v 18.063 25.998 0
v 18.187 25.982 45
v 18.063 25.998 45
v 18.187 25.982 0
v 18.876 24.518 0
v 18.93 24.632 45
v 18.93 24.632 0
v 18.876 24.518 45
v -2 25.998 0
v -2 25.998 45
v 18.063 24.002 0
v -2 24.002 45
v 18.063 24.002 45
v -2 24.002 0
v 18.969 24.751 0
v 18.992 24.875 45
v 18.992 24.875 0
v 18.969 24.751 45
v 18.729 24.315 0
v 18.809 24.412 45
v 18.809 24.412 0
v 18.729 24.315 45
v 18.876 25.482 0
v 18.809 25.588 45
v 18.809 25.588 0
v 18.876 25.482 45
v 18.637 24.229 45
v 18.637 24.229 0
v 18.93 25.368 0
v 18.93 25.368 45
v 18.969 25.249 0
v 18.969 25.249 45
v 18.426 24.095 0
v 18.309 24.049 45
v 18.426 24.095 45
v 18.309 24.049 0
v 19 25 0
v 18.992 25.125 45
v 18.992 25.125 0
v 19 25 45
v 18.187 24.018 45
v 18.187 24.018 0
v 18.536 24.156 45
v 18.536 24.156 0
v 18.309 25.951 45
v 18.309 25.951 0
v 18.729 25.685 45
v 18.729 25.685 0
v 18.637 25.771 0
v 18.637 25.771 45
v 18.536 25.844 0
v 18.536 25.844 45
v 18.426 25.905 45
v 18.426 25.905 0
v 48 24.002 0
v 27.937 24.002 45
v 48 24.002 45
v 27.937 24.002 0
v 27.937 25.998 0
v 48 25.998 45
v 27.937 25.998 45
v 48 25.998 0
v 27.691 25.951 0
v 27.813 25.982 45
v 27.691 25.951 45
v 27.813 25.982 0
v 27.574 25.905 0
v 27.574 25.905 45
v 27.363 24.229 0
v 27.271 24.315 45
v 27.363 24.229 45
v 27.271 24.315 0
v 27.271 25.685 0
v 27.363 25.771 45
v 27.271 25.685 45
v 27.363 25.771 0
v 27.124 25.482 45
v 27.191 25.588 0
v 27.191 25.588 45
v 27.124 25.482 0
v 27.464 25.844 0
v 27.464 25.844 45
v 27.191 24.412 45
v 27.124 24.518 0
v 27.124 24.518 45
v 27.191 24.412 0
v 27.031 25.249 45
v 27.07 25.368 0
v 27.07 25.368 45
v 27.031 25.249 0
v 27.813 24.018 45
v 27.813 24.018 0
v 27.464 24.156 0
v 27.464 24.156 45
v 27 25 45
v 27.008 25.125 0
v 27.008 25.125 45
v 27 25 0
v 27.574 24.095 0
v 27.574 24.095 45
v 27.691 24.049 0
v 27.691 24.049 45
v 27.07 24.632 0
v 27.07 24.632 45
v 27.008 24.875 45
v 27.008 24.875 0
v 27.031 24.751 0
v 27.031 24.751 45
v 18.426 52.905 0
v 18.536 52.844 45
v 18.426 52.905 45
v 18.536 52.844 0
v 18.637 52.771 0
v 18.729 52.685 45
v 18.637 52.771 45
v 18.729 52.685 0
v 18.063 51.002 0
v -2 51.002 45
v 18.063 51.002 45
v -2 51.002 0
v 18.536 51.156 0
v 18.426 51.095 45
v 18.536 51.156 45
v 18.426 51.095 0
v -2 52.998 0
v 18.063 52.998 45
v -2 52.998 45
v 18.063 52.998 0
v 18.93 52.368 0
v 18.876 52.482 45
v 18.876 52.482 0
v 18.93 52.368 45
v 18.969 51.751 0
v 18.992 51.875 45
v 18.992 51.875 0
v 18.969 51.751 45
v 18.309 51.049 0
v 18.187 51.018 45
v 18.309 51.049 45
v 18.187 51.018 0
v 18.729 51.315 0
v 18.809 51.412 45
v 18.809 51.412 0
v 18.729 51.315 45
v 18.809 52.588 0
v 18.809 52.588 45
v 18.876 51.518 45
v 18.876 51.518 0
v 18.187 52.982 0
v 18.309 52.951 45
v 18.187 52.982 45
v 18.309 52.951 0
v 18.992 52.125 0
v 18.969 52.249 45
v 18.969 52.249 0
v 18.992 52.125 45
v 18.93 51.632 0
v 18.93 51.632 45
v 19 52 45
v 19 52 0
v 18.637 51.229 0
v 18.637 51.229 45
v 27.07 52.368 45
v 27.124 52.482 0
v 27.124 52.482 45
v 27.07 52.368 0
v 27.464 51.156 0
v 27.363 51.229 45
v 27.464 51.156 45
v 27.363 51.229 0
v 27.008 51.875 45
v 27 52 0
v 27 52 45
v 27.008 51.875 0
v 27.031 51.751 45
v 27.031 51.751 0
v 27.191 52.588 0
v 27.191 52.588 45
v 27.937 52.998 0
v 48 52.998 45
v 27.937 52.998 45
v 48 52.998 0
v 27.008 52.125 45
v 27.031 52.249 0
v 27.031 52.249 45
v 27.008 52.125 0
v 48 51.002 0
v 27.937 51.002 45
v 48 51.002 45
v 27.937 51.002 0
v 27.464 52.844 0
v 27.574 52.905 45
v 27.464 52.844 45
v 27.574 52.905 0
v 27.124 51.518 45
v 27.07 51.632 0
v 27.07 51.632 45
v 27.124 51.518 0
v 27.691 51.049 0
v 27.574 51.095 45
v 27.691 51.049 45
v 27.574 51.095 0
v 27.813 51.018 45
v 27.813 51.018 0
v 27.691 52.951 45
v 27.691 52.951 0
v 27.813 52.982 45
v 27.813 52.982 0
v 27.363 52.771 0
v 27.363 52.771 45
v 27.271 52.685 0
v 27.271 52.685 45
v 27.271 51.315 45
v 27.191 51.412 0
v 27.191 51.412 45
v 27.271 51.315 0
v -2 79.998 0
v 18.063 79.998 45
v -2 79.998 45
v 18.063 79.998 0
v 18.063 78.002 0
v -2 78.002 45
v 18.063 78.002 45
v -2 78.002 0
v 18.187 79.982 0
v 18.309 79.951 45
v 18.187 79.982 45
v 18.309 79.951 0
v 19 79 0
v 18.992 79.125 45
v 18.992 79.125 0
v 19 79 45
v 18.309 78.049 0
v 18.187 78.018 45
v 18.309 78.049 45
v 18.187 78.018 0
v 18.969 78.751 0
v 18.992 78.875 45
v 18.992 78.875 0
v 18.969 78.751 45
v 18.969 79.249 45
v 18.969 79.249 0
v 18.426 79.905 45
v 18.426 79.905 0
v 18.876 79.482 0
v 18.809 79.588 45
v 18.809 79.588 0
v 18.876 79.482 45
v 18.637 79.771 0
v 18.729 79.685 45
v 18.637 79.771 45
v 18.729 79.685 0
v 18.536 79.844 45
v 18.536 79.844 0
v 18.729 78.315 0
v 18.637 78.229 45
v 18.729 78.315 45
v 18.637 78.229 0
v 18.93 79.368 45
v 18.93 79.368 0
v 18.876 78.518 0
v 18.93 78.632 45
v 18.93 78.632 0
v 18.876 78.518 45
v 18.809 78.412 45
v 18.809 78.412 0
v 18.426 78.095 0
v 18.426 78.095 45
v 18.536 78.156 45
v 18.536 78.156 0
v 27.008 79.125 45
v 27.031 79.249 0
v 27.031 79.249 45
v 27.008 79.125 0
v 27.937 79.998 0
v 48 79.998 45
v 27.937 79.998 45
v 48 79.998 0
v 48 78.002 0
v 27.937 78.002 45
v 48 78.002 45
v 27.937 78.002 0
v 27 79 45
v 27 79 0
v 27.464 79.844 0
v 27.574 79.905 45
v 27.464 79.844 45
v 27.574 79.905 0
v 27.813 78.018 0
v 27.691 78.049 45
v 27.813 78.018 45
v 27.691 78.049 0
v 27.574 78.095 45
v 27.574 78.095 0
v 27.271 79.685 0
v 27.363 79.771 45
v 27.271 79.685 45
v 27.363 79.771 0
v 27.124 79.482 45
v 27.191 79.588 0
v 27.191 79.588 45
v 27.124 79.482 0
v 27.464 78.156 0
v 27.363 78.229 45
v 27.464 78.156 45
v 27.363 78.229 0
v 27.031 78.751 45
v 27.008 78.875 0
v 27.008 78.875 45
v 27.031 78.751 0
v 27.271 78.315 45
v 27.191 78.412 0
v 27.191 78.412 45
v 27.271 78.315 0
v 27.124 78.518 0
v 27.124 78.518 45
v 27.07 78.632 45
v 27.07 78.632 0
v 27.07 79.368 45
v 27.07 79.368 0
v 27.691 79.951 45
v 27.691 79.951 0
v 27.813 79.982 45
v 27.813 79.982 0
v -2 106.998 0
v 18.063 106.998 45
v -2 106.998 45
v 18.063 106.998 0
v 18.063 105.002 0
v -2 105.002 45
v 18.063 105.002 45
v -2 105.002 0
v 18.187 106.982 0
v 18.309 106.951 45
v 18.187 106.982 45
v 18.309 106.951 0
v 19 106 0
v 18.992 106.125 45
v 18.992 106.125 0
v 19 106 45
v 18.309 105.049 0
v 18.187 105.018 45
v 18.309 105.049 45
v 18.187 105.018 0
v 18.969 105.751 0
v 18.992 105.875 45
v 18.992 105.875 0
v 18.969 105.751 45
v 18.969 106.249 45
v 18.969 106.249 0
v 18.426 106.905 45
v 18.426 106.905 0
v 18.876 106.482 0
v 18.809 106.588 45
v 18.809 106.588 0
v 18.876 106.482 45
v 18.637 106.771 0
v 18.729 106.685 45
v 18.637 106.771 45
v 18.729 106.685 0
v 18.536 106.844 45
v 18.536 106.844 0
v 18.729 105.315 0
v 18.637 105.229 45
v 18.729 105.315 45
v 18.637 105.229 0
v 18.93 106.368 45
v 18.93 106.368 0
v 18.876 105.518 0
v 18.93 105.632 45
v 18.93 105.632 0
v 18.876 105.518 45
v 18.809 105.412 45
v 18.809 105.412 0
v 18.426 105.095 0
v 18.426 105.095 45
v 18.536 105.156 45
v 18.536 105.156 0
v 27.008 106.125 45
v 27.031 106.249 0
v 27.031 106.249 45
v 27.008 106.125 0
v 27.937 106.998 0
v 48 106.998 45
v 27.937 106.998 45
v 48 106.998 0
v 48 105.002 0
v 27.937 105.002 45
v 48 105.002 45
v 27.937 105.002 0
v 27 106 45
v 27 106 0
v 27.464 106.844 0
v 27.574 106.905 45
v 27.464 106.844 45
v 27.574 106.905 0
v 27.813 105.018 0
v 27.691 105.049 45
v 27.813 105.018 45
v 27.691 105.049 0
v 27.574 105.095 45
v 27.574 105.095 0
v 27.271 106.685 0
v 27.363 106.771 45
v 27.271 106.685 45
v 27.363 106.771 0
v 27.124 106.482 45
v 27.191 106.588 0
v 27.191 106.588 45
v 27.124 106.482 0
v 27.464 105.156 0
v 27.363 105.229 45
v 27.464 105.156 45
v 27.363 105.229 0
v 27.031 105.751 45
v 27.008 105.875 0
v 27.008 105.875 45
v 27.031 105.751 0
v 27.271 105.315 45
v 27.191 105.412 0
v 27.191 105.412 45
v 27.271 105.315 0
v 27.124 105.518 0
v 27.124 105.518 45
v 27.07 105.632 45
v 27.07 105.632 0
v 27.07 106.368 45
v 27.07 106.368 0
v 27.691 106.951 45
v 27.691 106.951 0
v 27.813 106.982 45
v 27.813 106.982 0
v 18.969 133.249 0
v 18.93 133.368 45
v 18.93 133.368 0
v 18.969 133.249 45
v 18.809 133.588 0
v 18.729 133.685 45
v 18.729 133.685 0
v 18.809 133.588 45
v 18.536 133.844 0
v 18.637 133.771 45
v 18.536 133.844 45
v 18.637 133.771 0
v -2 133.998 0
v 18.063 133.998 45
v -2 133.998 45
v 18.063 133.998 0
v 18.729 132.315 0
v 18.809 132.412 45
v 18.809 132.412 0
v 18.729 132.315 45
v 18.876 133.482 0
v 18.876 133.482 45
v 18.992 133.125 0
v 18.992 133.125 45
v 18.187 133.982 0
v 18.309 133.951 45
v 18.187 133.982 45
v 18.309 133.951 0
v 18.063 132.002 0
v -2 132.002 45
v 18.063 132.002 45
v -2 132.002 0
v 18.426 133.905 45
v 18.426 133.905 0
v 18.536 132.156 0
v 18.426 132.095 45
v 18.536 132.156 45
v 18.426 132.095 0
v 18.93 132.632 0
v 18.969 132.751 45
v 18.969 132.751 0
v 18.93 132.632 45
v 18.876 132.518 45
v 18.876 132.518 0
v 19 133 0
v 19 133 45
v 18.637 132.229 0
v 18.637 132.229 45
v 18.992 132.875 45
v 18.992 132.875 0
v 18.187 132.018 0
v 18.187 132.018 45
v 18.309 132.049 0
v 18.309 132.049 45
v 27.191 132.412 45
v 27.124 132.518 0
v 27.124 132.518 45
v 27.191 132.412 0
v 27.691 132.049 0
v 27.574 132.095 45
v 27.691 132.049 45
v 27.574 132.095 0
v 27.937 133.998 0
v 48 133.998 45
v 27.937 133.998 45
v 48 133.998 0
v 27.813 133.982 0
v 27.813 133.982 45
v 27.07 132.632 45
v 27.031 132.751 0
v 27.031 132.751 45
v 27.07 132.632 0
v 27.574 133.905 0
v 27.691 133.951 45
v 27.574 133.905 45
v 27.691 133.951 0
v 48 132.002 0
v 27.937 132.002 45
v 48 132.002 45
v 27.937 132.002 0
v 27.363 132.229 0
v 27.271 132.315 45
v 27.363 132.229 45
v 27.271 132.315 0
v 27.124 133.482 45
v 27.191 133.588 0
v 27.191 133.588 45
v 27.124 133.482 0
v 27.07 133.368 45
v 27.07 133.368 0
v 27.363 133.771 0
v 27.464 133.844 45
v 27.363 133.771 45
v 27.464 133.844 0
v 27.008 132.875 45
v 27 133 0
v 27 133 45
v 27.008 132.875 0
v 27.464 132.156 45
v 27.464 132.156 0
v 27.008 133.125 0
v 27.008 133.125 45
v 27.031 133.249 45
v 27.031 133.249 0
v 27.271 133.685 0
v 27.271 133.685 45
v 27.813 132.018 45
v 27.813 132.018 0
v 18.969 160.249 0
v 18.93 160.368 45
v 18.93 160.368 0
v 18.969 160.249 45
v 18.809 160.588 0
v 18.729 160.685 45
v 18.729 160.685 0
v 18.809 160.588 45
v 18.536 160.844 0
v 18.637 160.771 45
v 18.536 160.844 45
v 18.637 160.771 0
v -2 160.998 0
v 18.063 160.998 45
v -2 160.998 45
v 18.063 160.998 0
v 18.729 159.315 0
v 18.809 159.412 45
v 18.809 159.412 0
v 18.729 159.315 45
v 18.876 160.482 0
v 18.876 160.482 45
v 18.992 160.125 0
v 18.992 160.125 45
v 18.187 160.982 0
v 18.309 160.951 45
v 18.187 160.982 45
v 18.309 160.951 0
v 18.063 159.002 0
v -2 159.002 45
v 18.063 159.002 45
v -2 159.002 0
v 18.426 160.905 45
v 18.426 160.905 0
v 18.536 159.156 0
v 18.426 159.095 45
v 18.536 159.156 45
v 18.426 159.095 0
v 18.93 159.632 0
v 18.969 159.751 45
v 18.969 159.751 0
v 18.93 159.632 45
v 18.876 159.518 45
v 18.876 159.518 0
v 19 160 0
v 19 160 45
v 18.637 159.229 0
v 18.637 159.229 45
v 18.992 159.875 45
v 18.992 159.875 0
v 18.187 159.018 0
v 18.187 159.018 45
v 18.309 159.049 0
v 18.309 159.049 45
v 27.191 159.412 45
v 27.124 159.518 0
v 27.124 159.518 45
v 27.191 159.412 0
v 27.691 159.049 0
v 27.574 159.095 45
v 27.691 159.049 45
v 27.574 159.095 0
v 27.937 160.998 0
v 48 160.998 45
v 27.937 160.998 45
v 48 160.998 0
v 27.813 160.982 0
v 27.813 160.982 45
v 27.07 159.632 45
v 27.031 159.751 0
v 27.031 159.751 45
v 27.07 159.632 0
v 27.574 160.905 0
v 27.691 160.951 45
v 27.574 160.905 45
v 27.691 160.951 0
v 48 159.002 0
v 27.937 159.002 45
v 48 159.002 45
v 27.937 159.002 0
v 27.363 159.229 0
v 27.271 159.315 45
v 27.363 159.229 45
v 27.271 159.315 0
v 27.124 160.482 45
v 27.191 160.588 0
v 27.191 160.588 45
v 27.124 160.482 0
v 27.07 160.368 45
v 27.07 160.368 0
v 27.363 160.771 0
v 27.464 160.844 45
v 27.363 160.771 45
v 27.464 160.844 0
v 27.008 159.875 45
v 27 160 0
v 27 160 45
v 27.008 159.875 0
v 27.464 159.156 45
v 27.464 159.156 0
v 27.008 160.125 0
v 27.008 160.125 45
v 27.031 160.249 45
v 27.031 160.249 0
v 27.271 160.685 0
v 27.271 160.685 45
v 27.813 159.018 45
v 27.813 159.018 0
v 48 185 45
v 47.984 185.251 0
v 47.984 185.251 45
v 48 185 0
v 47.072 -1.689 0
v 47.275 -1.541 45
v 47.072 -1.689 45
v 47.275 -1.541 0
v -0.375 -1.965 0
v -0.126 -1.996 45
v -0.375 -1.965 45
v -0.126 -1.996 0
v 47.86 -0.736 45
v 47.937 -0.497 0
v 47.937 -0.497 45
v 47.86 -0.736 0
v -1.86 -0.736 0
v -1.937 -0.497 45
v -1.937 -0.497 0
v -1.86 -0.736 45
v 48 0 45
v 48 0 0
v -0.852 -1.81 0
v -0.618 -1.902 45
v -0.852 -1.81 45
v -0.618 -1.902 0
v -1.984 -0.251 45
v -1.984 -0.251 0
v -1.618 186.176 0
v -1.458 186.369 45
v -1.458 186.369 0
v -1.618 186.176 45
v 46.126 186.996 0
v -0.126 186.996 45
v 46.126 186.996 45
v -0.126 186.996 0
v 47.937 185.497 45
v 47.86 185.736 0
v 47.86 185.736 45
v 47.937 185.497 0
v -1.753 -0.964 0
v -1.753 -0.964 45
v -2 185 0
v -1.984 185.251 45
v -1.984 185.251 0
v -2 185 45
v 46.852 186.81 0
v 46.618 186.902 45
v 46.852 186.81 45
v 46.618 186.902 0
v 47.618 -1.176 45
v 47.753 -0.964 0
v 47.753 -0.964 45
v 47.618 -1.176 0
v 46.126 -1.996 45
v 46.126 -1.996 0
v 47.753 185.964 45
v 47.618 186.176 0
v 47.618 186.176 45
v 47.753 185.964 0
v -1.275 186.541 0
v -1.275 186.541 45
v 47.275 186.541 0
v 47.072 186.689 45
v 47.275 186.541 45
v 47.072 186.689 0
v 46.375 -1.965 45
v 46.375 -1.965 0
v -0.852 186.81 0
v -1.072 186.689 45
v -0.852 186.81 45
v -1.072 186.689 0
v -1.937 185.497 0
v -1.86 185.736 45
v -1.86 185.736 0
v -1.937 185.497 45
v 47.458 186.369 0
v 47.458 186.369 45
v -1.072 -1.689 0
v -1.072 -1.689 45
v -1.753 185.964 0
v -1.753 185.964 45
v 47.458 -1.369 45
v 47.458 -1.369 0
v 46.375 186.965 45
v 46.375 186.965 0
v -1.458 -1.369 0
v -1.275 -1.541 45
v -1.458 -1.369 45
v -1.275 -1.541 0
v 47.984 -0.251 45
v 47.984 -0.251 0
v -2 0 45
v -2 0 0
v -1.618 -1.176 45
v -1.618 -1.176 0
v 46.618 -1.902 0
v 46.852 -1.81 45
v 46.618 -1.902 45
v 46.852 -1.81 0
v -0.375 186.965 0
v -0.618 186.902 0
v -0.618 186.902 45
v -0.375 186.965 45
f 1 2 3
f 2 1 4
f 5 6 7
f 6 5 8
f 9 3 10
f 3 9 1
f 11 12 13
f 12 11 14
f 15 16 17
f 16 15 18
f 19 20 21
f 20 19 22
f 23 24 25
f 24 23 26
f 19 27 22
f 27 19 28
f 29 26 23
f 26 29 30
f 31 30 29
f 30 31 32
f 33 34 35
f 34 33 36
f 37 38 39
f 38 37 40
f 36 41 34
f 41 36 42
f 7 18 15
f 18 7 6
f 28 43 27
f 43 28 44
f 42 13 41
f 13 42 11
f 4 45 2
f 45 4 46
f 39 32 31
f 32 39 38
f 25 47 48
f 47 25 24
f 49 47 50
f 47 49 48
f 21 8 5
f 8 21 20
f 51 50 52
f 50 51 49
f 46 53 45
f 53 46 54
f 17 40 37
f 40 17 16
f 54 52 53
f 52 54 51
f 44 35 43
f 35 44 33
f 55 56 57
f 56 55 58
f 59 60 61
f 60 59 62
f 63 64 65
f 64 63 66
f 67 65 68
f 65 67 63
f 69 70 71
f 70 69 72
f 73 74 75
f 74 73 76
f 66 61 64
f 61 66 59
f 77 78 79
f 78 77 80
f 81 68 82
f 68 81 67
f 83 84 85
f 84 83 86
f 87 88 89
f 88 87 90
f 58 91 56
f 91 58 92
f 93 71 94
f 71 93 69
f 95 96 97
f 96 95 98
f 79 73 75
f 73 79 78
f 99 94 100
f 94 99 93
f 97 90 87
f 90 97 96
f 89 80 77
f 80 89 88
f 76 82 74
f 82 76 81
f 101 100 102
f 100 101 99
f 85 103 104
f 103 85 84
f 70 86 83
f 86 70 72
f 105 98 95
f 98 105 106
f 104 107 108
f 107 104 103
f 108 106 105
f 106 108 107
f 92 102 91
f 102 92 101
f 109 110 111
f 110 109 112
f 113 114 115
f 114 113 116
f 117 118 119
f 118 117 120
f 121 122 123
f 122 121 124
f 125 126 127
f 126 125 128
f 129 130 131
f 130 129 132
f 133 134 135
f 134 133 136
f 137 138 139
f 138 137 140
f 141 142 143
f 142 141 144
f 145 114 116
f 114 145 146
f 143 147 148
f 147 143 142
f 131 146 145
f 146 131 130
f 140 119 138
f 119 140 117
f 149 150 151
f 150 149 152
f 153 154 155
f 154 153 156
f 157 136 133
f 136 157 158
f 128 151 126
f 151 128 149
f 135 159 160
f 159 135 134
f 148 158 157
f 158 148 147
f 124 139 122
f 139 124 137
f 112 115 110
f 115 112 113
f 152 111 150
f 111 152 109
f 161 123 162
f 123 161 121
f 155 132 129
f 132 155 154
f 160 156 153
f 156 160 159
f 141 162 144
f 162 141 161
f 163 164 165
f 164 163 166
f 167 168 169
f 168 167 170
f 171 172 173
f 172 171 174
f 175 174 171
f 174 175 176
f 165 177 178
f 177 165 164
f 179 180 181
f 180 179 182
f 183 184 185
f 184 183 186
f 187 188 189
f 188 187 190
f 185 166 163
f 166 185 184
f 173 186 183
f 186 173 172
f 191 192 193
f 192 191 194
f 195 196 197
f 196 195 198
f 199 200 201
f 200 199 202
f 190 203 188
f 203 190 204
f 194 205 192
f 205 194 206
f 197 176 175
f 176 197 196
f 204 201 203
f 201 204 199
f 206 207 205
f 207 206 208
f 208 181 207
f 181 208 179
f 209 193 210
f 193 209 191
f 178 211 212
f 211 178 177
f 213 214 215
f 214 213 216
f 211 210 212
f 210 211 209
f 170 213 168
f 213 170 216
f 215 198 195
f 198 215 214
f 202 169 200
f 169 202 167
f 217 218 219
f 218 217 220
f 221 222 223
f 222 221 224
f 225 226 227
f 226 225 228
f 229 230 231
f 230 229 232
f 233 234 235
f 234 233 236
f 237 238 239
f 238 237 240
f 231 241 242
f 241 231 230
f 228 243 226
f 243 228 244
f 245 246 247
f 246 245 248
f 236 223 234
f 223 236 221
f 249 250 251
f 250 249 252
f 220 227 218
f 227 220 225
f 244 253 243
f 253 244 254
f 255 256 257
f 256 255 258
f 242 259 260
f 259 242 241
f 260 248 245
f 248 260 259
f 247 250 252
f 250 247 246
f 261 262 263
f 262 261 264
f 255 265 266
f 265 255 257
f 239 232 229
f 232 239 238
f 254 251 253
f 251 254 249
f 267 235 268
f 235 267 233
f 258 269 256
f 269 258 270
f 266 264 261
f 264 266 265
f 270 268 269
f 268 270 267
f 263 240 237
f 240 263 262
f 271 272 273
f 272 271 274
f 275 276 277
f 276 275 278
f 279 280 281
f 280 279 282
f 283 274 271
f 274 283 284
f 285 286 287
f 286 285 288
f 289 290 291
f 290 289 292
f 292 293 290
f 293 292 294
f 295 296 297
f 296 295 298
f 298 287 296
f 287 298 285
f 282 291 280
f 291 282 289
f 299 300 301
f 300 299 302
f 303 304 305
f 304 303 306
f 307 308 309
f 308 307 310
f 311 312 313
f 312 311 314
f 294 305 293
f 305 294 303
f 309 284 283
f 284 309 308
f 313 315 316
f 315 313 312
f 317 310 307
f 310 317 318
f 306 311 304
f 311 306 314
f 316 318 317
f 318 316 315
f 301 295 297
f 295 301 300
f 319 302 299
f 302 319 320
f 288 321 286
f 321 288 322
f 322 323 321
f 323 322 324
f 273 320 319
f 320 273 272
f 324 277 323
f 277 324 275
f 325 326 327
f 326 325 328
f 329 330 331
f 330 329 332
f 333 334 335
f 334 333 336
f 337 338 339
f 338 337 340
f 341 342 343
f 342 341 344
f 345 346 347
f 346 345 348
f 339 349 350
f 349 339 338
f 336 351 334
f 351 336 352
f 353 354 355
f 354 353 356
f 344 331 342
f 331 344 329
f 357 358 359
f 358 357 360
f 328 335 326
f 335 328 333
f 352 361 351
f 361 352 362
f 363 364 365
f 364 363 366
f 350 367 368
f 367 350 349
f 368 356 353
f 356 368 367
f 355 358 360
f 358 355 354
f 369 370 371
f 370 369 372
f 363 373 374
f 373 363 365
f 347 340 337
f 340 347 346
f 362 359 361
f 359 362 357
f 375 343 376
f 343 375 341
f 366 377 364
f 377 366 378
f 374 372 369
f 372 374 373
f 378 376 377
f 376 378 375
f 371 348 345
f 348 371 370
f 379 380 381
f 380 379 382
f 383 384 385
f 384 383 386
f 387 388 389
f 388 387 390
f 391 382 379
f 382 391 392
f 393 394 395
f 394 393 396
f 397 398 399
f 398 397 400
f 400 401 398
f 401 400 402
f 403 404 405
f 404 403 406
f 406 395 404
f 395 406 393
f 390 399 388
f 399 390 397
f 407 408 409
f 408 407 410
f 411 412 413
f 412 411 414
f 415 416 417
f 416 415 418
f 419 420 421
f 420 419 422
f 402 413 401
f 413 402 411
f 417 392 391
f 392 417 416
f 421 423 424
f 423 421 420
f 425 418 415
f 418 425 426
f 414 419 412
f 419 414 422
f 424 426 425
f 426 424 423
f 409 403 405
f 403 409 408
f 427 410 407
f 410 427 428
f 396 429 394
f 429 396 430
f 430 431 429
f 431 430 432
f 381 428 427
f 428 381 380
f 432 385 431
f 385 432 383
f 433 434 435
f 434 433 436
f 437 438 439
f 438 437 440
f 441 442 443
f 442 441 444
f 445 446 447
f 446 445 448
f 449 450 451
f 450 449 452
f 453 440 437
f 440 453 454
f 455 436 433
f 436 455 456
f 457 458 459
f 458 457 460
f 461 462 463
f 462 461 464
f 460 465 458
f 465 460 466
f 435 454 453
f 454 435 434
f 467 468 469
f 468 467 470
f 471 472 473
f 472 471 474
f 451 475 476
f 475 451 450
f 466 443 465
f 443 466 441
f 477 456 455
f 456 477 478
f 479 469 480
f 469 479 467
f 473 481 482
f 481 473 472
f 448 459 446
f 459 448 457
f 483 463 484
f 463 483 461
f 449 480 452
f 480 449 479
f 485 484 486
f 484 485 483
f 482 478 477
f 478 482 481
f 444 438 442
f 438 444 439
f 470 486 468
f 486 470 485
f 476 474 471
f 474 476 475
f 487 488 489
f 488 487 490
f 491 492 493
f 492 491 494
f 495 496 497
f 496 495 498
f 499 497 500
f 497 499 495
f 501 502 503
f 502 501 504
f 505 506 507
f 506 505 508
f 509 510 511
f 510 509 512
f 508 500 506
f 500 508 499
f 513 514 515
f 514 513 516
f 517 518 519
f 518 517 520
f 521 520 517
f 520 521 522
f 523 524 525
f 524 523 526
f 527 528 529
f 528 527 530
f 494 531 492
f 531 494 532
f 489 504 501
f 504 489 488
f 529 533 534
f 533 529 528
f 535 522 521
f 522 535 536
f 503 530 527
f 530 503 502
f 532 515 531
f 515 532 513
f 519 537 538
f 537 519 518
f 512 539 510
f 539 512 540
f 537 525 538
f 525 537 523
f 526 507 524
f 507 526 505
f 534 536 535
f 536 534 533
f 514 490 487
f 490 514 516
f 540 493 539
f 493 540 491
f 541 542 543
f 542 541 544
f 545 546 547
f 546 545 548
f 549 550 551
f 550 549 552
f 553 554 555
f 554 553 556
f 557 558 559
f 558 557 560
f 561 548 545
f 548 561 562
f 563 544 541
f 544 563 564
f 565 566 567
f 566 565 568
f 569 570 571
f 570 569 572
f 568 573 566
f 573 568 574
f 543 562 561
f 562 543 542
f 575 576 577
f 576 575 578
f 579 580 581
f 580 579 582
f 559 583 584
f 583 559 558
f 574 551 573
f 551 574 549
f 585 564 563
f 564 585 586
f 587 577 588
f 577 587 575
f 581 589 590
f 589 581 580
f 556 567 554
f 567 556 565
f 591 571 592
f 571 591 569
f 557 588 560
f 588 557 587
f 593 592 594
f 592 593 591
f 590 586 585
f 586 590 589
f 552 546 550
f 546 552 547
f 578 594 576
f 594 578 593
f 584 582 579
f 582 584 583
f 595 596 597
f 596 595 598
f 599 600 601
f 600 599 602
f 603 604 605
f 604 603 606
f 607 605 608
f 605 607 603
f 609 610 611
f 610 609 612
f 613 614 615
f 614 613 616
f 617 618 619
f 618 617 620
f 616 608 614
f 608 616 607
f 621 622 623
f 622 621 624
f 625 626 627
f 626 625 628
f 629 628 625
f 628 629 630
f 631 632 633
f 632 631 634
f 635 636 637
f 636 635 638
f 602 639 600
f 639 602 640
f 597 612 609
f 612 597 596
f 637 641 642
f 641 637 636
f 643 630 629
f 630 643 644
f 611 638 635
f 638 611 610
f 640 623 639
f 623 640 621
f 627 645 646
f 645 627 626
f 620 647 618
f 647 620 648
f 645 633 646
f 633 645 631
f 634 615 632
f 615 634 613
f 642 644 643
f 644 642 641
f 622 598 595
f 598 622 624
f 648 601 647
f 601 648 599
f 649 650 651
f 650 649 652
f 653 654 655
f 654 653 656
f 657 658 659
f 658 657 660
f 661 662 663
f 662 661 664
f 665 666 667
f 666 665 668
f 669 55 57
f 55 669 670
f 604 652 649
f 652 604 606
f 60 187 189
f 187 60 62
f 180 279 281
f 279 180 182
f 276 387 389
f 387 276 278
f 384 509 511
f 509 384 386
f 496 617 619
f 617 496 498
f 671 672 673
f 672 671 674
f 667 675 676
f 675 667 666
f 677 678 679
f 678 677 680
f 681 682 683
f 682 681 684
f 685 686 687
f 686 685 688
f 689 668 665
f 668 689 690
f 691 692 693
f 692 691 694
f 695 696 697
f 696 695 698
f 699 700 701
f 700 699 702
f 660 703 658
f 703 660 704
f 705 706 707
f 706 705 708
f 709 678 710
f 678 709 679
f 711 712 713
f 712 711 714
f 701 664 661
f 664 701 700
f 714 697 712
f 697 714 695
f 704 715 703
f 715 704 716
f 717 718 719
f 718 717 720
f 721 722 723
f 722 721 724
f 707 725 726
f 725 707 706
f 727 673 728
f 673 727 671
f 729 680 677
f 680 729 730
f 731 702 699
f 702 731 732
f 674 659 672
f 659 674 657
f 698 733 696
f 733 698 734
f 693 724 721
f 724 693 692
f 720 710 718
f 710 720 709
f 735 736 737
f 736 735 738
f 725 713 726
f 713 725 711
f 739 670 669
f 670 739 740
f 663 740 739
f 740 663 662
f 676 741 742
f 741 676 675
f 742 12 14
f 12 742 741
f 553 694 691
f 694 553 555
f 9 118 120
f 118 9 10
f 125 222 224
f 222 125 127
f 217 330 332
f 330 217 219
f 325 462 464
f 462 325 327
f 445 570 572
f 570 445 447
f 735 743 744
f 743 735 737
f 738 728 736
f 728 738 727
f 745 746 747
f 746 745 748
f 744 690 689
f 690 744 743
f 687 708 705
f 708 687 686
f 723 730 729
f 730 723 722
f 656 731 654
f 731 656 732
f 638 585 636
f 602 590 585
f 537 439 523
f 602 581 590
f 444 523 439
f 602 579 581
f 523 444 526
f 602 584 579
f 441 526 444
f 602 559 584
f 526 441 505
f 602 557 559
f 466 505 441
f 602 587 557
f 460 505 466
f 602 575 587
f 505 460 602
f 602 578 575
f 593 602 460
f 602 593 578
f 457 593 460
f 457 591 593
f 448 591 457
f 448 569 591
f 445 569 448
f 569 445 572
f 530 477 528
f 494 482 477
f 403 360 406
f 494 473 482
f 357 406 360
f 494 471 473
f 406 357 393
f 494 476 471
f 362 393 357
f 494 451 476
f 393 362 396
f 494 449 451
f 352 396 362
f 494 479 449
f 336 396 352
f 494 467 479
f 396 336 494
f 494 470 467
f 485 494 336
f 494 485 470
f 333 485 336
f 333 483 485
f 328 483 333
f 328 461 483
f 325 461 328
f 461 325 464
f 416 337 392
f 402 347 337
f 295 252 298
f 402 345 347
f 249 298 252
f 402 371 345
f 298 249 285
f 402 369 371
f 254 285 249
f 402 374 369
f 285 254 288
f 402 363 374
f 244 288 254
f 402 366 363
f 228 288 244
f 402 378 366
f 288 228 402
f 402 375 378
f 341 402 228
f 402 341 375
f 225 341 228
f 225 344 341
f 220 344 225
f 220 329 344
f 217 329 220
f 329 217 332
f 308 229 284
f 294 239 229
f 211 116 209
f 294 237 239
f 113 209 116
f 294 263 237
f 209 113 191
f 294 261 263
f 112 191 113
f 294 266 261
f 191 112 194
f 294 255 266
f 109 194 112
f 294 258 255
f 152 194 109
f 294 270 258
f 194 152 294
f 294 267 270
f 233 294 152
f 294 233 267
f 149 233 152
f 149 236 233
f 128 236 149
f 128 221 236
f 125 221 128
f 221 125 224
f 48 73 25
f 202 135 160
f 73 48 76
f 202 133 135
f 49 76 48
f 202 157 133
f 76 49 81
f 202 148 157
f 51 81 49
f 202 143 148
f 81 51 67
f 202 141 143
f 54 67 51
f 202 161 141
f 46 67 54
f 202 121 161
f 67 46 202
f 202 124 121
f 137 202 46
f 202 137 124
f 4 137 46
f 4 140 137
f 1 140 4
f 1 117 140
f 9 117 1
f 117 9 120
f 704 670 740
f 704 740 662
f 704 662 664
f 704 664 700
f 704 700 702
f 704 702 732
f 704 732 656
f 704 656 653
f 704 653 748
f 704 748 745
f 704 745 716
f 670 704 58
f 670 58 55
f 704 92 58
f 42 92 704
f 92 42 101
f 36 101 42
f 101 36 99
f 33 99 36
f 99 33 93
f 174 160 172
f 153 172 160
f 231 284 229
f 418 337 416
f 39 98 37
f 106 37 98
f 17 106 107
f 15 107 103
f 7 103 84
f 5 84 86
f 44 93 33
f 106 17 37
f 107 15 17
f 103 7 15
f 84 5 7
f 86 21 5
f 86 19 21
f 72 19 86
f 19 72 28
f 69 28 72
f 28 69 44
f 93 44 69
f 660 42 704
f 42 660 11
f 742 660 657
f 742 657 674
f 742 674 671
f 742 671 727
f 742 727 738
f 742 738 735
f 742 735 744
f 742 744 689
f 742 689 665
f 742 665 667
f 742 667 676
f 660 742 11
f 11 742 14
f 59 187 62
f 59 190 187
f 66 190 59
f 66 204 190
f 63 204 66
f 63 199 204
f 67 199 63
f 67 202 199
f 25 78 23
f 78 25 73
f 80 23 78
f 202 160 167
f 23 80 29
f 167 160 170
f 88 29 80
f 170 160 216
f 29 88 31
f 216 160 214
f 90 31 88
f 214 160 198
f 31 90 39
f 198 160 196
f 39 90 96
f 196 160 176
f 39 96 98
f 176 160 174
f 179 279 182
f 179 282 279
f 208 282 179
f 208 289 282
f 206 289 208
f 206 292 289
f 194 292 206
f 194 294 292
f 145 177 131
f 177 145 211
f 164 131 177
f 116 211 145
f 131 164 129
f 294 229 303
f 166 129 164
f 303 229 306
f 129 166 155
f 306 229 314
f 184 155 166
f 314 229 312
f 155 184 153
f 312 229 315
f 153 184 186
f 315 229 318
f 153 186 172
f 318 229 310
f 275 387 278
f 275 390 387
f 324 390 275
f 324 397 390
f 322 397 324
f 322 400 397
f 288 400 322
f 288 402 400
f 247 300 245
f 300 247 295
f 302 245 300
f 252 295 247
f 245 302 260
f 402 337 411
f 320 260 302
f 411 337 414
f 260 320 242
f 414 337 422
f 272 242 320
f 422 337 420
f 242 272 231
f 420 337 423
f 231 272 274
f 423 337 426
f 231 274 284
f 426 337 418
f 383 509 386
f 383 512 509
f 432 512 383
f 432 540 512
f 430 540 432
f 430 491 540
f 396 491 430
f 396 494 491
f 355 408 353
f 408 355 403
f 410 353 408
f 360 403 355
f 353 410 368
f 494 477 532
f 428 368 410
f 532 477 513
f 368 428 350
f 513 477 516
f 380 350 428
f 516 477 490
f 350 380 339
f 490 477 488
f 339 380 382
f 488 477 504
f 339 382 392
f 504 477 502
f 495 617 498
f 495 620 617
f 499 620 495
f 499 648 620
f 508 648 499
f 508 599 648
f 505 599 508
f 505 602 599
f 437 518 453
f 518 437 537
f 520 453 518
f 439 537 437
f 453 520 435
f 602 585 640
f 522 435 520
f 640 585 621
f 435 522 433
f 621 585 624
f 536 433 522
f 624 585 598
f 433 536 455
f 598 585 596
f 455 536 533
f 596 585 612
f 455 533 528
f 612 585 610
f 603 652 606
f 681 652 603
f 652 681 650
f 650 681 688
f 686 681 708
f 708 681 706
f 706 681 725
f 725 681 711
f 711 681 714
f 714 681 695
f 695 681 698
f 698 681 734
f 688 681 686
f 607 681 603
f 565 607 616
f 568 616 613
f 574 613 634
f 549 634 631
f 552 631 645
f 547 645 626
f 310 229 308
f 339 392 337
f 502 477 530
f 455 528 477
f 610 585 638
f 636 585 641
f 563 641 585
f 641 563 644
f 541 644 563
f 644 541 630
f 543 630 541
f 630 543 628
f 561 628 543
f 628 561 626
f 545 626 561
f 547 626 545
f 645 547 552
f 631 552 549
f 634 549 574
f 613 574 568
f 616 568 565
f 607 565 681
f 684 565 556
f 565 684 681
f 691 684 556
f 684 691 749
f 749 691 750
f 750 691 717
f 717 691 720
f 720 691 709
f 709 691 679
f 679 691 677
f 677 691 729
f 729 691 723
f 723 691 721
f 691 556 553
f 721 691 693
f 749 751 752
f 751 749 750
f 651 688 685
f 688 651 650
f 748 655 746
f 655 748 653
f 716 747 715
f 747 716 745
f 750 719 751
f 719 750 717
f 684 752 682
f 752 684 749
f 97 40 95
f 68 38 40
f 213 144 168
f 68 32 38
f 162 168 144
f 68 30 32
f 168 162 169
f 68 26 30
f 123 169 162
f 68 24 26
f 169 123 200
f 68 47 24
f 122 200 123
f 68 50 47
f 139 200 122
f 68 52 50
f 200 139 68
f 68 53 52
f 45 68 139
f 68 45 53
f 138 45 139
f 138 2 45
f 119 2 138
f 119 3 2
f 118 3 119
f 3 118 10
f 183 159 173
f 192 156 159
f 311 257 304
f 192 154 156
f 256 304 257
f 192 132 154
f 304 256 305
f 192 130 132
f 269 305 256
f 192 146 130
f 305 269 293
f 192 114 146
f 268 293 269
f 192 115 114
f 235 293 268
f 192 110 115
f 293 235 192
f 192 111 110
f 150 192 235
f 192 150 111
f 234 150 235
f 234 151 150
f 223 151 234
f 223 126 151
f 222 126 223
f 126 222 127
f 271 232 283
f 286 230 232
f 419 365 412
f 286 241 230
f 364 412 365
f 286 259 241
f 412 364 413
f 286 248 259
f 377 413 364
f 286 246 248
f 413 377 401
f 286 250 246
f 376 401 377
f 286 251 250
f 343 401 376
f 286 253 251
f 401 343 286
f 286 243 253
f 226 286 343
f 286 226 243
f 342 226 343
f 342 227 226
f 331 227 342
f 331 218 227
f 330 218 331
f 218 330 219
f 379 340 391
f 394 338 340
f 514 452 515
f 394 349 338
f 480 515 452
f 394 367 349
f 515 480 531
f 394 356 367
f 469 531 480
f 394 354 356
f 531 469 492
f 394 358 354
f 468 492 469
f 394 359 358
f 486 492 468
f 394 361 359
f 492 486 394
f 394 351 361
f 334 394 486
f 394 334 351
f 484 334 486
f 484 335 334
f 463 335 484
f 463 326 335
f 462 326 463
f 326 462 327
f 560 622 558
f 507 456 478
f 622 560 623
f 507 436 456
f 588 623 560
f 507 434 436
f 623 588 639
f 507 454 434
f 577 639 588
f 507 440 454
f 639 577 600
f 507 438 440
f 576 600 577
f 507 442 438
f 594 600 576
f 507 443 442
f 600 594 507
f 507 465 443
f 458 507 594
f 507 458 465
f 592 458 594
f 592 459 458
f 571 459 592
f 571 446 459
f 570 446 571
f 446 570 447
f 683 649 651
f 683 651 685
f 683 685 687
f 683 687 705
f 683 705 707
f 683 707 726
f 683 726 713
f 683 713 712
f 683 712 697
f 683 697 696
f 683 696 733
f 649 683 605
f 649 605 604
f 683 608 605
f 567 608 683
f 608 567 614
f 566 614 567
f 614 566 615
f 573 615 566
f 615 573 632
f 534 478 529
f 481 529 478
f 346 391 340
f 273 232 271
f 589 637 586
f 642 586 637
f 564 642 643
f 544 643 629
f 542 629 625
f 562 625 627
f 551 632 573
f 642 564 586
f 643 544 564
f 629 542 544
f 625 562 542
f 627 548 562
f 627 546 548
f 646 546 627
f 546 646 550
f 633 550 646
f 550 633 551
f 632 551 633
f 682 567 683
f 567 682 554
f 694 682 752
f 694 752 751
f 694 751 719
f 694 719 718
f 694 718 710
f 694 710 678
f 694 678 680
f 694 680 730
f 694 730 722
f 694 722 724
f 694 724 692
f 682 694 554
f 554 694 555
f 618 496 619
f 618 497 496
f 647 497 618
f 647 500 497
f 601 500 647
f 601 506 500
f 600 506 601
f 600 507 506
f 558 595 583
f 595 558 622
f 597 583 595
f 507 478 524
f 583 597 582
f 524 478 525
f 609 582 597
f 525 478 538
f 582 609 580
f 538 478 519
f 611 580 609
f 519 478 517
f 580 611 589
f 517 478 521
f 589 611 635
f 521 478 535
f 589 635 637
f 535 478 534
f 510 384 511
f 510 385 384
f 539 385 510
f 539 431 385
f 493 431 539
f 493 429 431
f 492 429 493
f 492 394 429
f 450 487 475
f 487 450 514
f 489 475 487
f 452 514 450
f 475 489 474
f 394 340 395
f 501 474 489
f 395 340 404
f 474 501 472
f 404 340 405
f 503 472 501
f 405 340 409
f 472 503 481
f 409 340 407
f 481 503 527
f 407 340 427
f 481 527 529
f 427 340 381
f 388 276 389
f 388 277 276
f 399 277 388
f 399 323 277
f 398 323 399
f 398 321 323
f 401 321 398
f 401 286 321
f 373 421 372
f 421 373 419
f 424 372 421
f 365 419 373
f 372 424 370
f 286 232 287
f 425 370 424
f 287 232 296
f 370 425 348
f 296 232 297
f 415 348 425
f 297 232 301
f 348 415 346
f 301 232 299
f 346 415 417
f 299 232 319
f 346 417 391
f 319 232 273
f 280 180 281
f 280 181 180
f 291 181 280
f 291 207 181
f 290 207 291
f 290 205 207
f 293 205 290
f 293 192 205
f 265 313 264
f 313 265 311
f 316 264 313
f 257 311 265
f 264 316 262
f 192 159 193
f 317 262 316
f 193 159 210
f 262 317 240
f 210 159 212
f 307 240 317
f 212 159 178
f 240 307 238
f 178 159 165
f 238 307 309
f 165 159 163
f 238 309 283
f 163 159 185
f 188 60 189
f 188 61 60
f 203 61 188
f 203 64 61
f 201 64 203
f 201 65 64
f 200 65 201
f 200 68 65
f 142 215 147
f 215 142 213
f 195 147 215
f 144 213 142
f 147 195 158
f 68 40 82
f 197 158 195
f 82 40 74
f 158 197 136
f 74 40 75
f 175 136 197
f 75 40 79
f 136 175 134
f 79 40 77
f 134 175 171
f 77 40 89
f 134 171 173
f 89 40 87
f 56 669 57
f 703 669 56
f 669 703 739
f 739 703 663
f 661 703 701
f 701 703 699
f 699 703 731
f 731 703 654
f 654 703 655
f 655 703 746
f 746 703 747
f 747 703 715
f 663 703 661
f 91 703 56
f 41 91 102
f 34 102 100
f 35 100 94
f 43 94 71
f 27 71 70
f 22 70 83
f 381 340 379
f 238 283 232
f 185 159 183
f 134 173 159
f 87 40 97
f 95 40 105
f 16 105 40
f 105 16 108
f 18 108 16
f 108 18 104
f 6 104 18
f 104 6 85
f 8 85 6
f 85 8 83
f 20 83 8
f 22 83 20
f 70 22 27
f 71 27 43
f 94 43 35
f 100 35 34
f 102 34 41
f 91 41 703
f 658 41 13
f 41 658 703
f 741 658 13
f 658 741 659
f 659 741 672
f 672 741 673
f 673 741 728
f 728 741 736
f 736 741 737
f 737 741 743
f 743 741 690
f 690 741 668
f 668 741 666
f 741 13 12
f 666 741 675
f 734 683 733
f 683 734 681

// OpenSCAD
total_boxes=7;
box_width=50;
box_length=25;
box_height=45;
border_radius=2;
separator_width=2;
separator_gap=10;
$fn=50;

cyl_r           = separator_width/2;
bar_width       = (box_width - separator_gap) / 2;
cutter_z_depth  = -1 * separator_width; 
cutter_z_offset = 2 * separator_width;
total_separator = (total_boxes == 1) ? 0 : total_boxes - 1;
total_length    = (box_length * total_boxes) + (separator_width * total_separator) - border_radius;
total_width     = box_width - (border_radius * 2);

module bar(y_position){
    hull(){
        translate([-10, y_position, cutter_z_depth]) cylinder(r=cyl_r, h=box_height + cutter_z_offset);
        translate([bar_width - separator_width, y_position, cutter_z_depth]) cylinder(r=cyl_r, h=box_height + cutter_z_offset);
    }
    hull(){
        translate([(bar_width + separator_gap) - separator_width, y_position, cutter_z_depth]) cylinder(r=cyl_r, h=box_height + cutter_z_offset);
        translate([box_width + 10, y_position, cutter_z_depth]) cylinder(r=cyl_r, h=box_height + cutter_z_offset);
    }
}


difference(){
minkowski(){
cube([total_width, total_length, box_height - 1]);
cylinder(r = border_radius, h = 1);
}
for(i = [0:1:total_boxes - 2]){
 blade_position = box_length + (i * box_length) + (i * separator_width);
 #bar(blade_position);
 
 }
}
